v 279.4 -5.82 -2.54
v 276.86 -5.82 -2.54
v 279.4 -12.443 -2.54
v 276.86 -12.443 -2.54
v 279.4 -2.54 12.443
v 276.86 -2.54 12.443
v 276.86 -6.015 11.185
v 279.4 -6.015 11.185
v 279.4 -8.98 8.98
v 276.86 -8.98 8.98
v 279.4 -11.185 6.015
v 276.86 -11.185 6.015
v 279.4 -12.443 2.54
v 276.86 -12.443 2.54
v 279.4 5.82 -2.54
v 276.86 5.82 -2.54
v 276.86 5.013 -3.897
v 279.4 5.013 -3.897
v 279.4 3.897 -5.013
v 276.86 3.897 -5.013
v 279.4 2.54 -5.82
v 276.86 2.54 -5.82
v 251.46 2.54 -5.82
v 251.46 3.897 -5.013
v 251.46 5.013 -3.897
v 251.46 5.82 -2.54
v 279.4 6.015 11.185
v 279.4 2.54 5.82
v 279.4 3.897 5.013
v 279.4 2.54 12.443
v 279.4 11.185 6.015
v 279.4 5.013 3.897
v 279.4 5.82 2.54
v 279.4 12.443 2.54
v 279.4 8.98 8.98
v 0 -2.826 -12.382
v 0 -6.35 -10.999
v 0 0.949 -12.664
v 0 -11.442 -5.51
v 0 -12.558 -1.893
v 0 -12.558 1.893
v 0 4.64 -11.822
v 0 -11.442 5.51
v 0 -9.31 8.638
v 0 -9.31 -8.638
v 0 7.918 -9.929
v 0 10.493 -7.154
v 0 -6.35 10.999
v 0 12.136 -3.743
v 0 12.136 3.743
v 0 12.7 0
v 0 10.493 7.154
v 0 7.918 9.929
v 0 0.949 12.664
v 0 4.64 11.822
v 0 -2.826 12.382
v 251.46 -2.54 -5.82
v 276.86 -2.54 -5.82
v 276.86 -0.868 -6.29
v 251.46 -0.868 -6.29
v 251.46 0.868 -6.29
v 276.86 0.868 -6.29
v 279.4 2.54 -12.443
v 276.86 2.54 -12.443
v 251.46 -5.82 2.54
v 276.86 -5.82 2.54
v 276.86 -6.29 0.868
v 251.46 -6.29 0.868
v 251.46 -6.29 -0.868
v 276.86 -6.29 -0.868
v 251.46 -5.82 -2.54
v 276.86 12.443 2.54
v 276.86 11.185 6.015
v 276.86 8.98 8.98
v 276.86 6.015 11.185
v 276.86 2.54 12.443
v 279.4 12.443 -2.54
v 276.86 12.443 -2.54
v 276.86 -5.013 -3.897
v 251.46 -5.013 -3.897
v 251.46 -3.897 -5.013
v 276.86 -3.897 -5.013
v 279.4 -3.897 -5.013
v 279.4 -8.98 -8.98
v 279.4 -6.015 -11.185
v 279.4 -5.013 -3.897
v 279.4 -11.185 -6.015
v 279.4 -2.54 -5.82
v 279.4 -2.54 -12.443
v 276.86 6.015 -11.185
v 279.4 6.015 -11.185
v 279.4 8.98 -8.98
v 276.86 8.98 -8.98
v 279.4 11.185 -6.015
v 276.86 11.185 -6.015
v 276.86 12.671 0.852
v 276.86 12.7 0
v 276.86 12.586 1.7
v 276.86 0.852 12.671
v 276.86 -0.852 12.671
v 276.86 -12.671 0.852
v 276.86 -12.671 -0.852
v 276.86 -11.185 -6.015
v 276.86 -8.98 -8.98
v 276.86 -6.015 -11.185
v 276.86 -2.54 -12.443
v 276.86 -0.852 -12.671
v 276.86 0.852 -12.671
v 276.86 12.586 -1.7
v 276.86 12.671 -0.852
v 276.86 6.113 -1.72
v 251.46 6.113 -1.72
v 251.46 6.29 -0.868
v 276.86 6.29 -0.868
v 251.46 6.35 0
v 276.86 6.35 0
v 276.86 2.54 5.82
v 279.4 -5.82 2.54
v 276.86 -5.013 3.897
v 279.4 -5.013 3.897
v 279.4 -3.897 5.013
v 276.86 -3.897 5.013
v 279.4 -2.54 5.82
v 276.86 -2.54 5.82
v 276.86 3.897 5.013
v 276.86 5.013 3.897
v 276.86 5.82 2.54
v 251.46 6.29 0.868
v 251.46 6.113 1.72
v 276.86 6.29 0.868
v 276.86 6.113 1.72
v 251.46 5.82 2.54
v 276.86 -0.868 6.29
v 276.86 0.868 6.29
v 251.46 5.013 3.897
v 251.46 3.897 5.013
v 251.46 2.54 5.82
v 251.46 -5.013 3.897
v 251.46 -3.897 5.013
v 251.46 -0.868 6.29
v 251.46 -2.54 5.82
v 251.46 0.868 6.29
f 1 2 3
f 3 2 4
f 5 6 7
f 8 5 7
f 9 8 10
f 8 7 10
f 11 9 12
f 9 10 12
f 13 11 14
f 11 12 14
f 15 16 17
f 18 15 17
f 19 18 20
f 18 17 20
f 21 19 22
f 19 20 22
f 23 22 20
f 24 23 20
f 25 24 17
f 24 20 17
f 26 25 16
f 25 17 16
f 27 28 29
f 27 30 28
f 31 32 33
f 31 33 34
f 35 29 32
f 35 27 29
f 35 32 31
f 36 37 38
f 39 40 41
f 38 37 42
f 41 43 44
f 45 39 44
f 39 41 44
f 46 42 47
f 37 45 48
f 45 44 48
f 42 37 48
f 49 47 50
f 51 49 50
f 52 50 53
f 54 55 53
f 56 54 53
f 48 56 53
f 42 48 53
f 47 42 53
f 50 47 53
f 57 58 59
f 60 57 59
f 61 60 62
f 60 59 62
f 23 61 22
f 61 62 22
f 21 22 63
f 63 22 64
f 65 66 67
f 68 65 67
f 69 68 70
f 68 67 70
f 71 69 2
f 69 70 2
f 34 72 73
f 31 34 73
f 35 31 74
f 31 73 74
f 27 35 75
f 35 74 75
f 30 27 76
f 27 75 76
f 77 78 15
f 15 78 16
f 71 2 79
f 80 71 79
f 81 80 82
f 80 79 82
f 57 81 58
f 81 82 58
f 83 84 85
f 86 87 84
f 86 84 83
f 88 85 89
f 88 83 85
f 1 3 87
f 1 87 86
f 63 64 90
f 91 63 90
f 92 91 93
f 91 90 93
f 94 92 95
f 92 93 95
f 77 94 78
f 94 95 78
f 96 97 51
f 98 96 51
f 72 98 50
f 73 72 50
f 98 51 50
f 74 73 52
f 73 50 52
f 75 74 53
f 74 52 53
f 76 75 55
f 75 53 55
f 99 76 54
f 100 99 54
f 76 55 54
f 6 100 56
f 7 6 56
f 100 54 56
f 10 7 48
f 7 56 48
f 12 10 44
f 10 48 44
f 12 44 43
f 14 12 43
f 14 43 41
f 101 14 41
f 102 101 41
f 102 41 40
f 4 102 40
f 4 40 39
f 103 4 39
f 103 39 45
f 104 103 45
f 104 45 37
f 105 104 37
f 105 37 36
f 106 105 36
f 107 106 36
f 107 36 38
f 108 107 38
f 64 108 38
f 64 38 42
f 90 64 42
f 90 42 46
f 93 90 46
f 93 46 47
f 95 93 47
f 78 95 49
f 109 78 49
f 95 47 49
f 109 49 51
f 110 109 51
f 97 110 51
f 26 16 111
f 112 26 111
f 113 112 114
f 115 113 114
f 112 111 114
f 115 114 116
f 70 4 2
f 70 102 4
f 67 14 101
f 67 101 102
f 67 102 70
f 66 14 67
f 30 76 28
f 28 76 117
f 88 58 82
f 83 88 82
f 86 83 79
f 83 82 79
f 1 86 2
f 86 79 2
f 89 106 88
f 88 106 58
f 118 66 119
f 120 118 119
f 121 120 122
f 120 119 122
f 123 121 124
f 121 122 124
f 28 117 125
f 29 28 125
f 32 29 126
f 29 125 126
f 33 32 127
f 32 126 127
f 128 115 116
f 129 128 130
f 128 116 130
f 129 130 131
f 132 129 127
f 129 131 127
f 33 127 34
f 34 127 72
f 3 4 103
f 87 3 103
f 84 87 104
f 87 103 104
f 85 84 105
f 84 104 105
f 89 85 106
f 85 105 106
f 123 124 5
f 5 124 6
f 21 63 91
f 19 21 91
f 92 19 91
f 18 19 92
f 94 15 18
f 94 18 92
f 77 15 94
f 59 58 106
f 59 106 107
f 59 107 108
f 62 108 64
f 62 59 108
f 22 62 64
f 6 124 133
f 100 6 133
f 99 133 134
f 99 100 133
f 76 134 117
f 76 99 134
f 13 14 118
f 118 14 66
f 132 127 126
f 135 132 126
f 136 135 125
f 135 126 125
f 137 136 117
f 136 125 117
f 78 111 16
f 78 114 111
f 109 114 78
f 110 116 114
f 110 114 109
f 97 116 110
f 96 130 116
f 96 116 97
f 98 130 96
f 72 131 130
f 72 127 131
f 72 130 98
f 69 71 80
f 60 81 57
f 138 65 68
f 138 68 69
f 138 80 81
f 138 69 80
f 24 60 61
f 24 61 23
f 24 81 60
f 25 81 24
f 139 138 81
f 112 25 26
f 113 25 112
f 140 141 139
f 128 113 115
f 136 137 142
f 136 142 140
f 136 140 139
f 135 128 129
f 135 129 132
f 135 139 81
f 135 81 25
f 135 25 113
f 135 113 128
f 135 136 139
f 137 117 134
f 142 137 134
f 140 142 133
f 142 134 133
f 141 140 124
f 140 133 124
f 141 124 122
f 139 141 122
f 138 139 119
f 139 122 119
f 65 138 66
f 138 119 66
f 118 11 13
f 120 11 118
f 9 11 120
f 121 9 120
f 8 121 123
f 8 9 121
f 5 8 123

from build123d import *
from build123d import SkipClean  # not in build123d's __all__

# Parameters (mm, degrees)
F0_R     = 12.7
F1_DEPTH = 276.86
F3_DEPTH = 2.54
F4_DEPTH = 25.4


with BuildPart() as f1:
    # F0 (on Right) → F1 (new body)
    with BuildSketch(Plane.YZ):
        Circle(F0_R)
    extrude(amount=F1_DEPTH)

    # F2 (on face) → F3 (join)
    with BuildSketch(Plane.YZ.offset(276.86)):
        with BuildLine():
            ThreePointArc((2.54, 5.8198711326), (4.4901280605, 4.4901280605), (5.8198711326, 2.54))
            Line((5.8198711326, 2.54), (12.4434078933, 2.54))
            ThreePointArc((12.4434078933, 2.54), (8.9802561211, 8.9802561211), (2.54, 12.4434078933))
            Line((2.54, 12.4434078933), (2.54, 5.8198711326))
        make_face()
        with BuildLine():
            ThreePointArc((-5.8198711326, 2.54), (-4.4901280605, 4.4901280605), (-2.54, 5.8198711326))
            Line((-2.54, 5.8198711326), (-2.54, 12.4434078933))
            ThreePointArc((-2.54, 12.4434078933), (-8.9802561211, 8.9802561211), (-12.4434078933, 2.54))
            Line((-12.4434078933, 2.54), (-5.8198711326, 2.54))
        make_face()
        with BuildLine():
            Line((-2.54, -12.4434078933), (-2.54, -5.8198711326))
            ThreePointArc((-2.54, -5.8198711326), (-4.4901280605, -4.4901280605), (-5.8198711326, -2.54))
            Line((-5.8198711326, -2.54), (-12.4434078933, -2.54))
            ThreePointArc((-12.4434078933, -2.54), (-8.9802561211, -8.9802561211), (-2.54, -12.4434078933))
        make_face()
        with BuildLine():
            Line((12.4434078933, -2.54), (5.8198711326, -2.54))
            ThreePointArc((5.8198711326, -2.54), (4.4901280605, -4.4901280605), (2.54, -5.8198711326))
            Line((2.54, -5.8198711326), (2.54, -12.4434078933))
            ThreePointArc((2.54, -12.4434078933), (8.9802561211, -8.9802561211), (12.4434078933, -2.54))
        make_face()
    extrude(amount=F3_DEPTH)

    # F2 (on face) → F4 (cut)
    with BuildSketch(Plane.YZ.offset(276.86)):
        with BuildLine():
            ThreePointArc((5.8198711326, -2.54), (6.2160550871, -1.2973662374), (6.35, 0))
            ThreePointArc((6.35, 0), (6.2160550871, 1.2973662374), (5.8198711326, 2.54))
            ThreePointArc((5.8198711326, 2.54), (4.4901280605, 4.4901280605), (2.54, 5.8198711326))
            ThreePointArc((2.54, 5.8198711326), (0, 6.35), (-2.54, 5.8198711326))
            ThreePointArc((-2.54, 5.8198711326), (-4.4901280605, 4.4901280605), (-5.8198711326, 2.54))
            ThreePointArc((-5.8198711326, 2.54), (-6.35, 0), (-5.8198711326, -2.54))
            ThreePointArc((-5.8198711326, -2.54), (-4.4901280605, -4.4901280605), (-2.54, -5.8198711326))
            ThreePointArc((-2.54, -5.8198711326), (0, -6.35), (2.54, -5.8198711326))
            ThreePointArc((2.54, -5.8198711326), (4.4901280605, -4.4901280605), (5.8198711326, -2.54))
        make_face()
    with SkipClean():  # cleaning this boolean's faces spoils the solid; the shape is the same uncleaned
        extrude(amount=-F4_DEPTH, mode=Mode.SUBTRACT)


solid = f1.part
